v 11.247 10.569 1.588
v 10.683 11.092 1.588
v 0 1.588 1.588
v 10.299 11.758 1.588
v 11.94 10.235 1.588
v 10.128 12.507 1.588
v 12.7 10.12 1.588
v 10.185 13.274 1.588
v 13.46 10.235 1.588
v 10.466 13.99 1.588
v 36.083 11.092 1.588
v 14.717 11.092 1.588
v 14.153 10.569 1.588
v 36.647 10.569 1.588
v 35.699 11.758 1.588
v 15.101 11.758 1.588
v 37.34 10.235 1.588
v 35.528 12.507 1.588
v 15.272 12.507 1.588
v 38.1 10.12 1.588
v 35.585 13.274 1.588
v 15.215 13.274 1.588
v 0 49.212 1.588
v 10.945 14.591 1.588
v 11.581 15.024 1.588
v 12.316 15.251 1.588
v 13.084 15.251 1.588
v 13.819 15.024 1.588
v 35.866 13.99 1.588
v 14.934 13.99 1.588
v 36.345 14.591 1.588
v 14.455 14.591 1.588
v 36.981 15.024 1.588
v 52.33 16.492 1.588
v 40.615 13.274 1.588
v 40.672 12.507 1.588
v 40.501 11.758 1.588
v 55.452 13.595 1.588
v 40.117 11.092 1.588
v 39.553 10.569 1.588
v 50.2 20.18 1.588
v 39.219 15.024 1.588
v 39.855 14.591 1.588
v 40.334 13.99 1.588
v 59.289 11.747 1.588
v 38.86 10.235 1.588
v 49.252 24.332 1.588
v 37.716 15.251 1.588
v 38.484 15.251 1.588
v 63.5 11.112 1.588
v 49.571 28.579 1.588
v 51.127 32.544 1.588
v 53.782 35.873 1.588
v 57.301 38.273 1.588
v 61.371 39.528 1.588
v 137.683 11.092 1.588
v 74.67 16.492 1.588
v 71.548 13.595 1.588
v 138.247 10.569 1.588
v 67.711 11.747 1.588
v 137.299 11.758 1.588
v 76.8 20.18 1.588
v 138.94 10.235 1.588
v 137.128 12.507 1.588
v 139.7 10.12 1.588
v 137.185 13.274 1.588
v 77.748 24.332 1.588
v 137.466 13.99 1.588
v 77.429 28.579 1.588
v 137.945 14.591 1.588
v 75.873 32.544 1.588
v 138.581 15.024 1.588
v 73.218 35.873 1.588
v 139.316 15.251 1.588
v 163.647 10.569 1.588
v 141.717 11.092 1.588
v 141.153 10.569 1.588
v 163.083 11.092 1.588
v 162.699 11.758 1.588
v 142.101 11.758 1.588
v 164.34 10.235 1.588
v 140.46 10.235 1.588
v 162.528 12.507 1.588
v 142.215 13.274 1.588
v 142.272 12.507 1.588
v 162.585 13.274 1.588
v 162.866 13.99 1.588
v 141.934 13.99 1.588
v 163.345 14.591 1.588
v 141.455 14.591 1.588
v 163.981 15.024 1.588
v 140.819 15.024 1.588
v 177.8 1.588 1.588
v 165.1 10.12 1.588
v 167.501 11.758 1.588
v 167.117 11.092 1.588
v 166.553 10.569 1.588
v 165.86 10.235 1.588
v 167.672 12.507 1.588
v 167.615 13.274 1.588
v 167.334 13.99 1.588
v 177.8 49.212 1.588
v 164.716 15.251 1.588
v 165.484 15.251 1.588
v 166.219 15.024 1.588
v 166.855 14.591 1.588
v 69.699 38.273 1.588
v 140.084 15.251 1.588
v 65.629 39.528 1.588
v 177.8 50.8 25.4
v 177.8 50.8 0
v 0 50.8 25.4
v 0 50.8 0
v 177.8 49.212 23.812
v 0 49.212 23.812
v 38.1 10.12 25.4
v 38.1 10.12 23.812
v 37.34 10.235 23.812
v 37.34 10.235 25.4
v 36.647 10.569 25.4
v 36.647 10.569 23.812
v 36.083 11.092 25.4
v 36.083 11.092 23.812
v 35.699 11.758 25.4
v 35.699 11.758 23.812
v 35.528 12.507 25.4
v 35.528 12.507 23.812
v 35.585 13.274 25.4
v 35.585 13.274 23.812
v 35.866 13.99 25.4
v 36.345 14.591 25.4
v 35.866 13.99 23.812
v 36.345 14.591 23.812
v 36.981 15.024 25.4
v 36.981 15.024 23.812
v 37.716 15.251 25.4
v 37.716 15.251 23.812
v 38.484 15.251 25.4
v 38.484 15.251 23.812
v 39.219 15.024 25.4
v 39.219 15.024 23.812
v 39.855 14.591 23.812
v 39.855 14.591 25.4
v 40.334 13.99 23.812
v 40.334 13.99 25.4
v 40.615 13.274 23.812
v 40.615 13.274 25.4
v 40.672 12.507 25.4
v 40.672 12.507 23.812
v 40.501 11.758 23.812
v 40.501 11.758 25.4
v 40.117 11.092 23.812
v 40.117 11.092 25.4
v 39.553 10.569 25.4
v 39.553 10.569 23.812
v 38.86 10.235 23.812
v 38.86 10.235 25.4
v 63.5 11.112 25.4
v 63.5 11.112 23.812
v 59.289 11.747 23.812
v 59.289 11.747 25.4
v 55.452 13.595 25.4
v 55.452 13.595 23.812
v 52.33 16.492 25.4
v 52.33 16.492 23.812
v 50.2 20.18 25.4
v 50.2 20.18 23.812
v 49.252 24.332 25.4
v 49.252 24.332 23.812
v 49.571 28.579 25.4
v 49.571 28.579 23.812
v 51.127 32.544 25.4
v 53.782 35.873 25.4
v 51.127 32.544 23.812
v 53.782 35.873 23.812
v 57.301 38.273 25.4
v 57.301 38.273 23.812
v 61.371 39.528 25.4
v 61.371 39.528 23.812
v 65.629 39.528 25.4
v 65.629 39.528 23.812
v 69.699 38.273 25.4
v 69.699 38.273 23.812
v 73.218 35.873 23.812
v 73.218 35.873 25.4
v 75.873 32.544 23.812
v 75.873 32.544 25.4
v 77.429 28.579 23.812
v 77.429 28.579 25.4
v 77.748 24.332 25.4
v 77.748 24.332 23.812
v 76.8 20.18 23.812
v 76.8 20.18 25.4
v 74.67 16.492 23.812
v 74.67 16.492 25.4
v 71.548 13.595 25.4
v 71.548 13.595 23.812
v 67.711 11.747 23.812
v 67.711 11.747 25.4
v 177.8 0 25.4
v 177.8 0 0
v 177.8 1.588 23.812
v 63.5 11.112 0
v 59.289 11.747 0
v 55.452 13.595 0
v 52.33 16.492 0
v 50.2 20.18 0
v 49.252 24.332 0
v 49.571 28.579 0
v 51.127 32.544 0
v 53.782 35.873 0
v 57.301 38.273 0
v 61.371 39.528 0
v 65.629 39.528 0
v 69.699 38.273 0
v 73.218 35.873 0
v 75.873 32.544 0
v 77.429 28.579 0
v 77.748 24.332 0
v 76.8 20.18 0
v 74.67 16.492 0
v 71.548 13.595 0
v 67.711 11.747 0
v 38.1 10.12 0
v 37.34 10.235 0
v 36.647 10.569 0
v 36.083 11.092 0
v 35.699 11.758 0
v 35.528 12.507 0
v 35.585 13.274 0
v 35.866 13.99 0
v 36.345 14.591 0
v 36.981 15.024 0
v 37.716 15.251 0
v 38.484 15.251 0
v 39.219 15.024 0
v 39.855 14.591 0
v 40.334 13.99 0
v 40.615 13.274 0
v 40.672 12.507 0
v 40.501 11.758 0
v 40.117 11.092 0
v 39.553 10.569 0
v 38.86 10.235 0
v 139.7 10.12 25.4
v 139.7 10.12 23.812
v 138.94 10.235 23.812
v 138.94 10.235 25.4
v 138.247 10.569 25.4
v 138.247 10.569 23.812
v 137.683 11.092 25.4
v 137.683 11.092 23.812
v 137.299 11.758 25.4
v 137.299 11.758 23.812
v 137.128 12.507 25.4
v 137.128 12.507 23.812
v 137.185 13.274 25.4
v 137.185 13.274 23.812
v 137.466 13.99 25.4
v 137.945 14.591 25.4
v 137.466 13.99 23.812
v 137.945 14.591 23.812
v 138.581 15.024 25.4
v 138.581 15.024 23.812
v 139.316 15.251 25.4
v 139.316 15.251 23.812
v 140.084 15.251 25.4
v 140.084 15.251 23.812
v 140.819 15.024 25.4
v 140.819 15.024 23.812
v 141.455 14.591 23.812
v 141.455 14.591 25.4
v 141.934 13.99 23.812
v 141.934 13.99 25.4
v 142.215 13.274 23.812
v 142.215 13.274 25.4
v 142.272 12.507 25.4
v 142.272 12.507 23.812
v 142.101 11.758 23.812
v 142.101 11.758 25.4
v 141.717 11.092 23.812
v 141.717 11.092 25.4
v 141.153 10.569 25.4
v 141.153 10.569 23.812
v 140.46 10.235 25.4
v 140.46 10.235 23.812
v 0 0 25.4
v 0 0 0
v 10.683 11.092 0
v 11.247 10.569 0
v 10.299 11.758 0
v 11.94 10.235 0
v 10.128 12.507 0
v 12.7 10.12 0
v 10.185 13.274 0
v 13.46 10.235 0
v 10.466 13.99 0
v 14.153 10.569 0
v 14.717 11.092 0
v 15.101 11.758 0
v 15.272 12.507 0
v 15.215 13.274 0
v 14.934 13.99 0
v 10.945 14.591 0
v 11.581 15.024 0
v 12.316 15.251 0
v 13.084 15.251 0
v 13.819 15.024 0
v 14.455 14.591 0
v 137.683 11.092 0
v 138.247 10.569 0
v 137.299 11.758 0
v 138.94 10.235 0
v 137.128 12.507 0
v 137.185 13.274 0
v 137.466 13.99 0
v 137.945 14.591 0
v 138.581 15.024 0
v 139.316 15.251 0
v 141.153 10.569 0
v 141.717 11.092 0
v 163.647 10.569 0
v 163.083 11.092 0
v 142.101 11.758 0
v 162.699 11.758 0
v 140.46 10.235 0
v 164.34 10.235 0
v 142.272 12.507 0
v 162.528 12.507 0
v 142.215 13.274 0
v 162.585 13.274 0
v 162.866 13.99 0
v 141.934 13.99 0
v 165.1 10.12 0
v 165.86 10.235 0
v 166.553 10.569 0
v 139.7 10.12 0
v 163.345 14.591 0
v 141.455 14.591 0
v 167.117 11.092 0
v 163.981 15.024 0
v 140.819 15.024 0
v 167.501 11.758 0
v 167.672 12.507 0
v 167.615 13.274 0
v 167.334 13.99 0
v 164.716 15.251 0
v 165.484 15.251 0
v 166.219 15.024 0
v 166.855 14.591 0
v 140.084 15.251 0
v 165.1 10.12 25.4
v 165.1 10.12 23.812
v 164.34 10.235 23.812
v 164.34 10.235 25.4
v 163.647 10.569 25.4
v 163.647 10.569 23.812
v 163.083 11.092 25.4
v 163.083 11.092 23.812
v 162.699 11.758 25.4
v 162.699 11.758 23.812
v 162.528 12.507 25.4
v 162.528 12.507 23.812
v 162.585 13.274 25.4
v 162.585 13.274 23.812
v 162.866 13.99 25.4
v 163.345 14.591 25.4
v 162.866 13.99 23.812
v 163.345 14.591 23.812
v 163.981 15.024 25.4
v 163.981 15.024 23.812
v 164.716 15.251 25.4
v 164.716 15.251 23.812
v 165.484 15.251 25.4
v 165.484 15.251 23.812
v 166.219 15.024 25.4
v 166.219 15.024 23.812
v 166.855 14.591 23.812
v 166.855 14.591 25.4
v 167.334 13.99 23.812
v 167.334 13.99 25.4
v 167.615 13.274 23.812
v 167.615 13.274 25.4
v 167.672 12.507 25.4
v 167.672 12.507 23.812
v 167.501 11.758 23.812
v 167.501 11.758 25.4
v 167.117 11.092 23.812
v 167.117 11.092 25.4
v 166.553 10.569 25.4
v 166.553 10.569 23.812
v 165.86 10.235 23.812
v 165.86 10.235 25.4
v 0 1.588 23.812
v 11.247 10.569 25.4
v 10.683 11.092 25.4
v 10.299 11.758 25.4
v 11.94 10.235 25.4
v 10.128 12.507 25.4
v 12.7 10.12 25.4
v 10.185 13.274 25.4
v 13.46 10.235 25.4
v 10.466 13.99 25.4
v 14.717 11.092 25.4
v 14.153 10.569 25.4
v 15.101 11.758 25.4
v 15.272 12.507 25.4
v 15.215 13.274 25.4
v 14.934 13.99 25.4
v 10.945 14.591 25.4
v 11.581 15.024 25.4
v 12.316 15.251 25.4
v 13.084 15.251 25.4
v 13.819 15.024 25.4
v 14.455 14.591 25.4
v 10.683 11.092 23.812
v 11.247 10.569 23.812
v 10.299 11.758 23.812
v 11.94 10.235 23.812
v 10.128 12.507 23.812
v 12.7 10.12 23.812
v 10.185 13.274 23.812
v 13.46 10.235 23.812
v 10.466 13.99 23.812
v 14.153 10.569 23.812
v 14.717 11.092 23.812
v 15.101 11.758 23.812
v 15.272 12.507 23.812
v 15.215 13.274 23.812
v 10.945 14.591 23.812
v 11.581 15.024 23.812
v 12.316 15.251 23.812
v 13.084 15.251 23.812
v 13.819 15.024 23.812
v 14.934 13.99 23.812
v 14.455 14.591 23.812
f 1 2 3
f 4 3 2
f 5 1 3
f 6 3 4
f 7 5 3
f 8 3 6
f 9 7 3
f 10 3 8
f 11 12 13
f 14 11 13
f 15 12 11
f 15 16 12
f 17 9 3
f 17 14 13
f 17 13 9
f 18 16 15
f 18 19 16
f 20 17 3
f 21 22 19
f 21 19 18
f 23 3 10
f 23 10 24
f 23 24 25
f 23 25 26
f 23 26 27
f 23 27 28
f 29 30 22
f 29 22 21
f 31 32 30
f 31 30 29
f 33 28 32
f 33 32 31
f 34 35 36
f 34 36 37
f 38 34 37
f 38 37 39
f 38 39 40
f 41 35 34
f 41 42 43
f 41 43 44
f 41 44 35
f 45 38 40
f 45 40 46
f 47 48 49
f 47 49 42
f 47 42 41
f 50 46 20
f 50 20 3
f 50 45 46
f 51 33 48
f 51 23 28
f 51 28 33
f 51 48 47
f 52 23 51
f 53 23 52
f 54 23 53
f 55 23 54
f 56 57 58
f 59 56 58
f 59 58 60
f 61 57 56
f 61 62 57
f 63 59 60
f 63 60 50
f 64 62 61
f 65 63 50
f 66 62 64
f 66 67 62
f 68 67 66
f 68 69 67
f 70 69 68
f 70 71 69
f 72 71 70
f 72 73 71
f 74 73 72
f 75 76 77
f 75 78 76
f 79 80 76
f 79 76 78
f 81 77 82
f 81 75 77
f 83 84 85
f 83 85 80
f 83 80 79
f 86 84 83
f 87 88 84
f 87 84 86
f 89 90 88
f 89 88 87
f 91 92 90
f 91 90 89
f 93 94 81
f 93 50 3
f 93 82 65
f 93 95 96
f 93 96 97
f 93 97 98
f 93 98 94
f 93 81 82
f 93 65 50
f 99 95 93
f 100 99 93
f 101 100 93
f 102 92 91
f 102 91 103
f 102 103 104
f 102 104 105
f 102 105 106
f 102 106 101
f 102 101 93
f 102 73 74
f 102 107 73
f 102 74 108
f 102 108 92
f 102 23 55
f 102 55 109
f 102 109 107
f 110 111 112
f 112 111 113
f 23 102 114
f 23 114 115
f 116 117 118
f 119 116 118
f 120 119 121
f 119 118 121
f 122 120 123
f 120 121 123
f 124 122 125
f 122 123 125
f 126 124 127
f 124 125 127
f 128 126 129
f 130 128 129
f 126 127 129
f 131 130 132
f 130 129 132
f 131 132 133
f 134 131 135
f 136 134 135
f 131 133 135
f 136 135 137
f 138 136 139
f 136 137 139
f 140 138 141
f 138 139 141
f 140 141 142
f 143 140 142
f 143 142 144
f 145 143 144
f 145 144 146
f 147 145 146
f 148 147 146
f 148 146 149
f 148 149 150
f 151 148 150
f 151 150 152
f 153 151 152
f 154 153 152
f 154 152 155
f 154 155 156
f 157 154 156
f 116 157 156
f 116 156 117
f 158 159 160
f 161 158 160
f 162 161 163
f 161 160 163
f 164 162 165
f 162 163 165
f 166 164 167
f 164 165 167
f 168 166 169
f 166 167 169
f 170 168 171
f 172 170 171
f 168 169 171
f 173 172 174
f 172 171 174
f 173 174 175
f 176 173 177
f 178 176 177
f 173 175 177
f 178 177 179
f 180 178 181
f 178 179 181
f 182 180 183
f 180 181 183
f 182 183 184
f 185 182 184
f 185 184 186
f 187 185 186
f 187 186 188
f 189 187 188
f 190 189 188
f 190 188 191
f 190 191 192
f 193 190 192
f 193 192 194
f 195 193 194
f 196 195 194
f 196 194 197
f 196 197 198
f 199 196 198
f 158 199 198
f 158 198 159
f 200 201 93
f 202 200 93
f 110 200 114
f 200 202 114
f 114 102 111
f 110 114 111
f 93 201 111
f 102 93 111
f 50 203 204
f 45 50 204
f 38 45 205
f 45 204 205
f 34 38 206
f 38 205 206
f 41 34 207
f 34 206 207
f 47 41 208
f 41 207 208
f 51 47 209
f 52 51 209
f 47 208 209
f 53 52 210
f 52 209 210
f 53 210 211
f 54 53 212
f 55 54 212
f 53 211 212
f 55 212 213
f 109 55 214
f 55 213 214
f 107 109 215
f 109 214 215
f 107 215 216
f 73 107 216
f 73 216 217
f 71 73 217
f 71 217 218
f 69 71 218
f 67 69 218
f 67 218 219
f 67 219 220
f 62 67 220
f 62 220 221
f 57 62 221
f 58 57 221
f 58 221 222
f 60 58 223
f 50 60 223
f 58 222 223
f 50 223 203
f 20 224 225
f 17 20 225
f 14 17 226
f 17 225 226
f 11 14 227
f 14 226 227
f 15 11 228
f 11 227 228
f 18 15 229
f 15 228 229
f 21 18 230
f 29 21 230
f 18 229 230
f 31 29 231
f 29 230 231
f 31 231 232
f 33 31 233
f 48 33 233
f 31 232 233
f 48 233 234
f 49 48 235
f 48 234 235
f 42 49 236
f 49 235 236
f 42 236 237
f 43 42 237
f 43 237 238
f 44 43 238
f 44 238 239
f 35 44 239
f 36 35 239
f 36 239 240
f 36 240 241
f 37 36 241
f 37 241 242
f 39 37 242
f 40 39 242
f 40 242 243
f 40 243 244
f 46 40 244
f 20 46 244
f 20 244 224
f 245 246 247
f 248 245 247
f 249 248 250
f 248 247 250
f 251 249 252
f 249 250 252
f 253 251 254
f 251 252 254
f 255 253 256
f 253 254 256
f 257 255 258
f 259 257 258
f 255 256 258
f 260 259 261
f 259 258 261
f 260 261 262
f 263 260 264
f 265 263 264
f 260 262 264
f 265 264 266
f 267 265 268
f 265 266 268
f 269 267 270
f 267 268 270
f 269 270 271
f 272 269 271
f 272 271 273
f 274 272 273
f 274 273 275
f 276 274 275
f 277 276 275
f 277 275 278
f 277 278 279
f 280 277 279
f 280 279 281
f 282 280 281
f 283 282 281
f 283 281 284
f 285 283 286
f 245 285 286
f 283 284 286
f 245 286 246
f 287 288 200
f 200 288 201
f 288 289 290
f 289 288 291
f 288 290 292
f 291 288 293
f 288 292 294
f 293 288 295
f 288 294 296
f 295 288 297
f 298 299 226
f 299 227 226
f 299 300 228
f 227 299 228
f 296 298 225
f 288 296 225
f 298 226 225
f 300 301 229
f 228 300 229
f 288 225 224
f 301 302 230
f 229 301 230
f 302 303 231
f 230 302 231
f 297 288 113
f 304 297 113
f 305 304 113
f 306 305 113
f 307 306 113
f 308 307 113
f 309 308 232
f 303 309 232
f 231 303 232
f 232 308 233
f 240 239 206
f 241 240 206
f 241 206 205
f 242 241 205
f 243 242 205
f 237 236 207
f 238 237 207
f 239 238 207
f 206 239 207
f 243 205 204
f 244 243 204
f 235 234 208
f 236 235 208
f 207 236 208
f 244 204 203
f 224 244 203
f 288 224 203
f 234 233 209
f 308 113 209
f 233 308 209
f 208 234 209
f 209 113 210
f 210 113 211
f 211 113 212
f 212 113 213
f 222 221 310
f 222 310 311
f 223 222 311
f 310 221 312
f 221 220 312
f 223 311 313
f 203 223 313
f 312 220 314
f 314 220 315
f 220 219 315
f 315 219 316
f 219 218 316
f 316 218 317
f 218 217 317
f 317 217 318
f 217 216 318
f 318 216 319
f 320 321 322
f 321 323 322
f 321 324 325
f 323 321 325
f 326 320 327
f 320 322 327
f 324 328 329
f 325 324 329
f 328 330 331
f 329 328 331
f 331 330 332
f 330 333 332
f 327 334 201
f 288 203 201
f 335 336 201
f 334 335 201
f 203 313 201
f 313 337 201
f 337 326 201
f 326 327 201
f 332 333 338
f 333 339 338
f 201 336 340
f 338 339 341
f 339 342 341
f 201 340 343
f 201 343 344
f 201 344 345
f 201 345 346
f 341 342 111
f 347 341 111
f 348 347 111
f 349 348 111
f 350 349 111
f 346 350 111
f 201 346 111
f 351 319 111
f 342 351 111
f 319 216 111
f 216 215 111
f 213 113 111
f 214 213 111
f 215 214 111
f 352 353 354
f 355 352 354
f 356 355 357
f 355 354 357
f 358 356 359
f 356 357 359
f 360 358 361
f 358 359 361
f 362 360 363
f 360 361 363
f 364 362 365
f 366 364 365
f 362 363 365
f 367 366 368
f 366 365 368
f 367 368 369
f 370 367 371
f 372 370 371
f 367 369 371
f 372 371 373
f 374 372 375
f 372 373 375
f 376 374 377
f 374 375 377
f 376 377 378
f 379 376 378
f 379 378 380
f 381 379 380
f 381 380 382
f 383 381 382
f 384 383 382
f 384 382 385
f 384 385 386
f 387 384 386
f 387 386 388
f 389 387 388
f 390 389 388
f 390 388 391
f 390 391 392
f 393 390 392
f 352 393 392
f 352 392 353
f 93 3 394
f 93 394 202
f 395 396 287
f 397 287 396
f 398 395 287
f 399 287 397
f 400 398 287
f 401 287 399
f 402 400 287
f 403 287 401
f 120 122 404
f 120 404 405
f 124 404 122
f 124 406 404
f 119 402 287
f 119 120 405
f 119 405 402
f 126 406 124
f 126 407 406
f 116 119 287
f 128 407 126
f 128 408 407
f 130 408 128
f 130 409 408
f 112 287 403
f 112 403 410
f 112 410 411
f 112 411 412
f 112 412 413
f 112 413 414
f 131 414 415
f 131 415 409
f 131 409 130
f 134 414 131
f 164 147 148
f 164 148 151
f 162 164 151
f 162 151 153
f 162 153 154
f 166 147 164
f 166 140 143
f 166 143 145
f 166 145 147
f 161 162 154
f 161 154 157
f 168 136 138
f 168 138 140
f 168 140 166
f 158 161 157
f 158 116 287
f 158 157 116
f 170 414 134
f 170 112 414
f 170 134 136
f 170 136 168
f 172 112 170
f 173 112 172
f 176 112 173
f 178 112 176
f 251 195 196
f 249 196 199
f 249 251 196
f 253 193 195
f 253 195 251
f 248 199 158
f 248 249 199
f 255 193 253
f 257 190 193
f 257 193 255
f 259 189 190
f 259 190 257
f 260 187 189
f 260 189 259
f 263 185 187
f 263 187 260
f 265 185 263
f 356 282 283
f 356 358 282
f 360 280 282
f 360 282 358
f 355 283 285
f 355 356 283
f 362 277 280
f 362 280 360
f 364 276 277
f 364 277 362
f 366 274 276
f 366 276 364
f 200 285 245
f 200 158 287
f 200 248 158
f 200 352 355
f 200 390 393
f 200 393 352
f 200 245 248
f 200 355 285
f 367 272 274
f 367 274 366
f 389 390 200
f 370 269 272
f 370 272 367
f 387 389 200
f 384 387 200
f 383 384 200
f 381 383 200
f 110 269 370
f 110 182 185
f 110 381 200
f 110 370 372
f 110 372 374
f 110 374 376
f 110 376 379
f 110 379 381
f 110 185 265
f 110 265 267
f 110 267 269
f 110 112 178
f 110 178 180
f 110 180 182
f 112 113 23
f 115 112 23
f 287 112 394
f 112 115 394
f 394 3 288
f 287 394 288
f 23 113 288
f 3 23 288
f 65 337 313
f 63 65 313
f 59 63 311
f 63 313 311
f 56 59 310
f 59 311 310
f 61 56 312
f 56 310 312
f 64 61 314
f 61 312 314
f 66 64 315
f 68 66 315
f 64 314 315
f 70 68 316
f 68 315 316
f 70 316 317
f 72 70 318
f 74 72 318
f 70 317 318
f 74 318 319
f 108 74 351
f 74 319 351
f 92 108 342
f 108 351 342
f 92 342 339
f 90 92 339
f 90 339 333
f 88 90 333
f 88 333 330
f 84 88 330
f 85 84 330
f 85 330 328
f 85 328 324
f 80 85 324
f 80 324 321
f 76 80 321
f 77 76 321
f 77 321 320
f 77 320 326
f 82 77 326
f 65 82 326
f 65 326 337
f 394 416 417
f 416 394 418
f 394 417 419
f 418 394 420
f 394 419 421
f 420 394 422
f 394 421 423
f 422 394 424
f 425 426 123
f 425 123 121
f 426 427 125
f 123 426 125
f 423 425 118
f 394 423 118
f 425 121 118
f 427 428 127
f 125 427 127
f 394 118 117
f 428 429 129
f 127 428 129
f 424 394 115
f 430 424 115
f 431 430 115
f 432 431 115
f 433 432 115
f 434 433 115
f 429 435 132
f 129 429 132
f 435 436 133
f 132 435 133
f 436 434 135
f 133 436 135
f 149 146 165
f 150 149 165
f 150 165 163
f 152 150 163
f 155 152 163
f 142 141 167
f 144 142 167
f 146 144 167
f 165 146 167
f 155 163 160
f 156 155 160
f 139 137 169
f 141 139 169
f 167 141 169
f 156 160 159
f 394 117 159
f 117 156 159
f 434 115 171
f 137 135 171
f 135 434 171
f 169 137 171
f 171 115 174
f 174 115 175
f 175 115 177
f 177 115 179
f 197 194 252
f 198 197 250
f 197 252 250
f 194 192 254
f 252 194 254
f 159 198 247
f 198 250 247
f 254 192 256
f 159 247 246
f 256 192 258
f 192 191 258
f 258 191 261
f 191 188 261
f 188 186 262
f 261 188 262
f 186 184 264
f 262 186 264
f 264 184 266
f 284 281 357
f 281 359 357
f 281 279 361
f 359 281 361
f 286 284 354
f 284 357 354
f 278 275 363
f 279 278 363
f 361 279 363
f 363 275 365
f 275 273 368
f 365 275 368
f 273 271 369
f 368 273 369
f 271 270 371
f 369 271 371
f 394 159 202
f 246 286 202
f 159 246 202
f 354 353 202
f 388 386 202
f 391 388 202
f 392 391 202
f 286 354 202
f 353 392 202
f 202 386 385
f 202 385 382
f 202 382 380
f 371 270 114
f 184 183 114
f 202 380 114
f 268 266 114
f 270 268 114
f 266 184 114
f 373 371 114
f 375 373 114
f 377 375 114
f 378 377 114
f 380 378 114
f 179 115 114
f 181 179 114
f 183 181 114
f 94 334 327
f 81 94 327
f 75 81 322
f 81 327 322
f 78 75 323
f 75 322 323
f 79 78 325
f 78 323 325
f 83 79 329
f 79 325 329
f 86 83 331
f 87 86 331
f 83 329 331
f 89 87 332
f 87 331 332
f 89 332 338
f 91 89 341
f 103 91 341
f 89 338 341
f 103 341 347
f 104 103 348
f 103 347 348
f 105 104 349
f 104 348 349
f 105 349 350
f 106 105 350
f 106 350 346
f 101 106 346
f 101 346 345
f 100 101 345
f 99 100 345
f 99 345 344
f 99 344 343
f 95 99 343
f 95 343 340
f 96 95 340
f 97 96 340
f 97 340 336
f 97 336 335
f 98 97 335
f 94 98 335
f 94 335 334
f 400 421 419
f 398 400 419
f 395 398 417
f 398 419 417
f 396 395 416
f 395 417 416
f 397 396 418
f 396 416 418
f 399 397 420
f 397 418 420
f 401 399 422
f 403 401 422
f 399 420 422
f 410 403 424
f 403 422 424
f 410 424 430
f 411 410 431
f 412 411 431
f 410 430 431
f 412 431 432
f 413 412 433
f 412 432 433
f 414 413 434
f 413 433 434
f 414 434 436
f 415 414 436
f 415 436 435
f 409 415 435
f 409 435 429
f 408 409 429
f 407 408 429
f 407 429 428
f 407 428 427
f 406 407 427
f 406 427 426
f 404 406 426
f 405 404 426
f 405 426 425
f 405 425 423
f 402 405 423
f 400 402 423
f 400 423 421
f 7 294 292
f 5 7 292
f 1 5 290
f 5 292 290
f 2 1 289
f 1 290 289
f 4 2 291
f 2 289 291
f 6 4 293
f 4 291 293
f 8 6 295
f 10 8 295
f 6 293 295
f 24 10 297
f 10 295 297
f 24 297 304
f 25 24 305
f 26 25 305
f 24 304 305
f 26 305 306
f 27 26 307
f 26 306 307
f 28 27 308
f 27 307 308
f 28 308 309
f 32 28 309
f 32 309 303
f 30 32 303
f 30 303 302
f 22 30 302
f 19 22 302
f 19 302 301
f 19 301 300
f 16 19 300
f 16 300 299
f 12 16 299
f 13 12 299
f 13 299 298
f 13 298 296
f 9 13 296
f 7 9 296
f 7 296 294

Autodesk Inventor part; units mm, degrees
ref_plane "YZ Plane" through (0, 0, 0) normal (1, 0, 0) x (0, 1, 0)
ref_plane "XZ Plane" through (0, 0, 0) normal (0, 1, 0) x (-1, 0, 0)
ref_plane "XY Plane" through (0, 0, 0) normal (0, 0, 1) x (1, 0, 0)
sketch "Sketch1" plane through (0, 0, 0) normal (0, 0, 1) x (1, 0, 0)
  line L0 (0, 0) -> (177.8, 0)
  line L1 (177.8, 0) -> (177.8, 50.8)
  line L2 (177.8, 50.8) -> (0, 50.8)
  line L3 (0, 50.8) -> (0, 0)
  dimension "d0" = 177.8
  dimension "d1" = 50.8
extrude "Extrusion1" add sketch "Sketch1" along normal blind 25.4
shell "Shell1" thickness 1.5875 removed faces 2 at (0, 33.8667, 16.9333) at (177.8, 16.9333, 16.9333)
sketch "Sketch2" plane through (0, 0, 25.4) normal (0, 0, 1) x (1, 0, 0)
  line L0 (0, 0) -> (63.5, 0) construction
  line L1 (63.5, 0) -> (63.5, 25.4) construction
  line L2 (63.5, 25.4) -> (0, 25.4) construction
  line L3 (0, 25.4) -> (0, 0) construction
  dimension "d5" = 63.5
  dimension "d13" = 25.4
hole "Hole1" at (63.5, 25.4, 25.4) direction (0, 0, -1) diameter 28.575 end through all
hole "Hole2" at (12.7, 12.7, 25.4) direction (0, 0, -1) diameter 5.1594 end through all
hole "Hole3" at (38.1, 12.7, 25.4) direction (0, 0, -1) diameter 5.1594 end through all
hole "Hole4" at (165.1, 12.7, 25.4) direction (0, 0, -1) diameter 5.1594 end through all
hole "Hole5" at (139.7, 12.7, 25.4) direction (0, 0, -1) diameter 5.1594 end through all
properties part number "1x2 5 in Beam Flywheel Mount"
